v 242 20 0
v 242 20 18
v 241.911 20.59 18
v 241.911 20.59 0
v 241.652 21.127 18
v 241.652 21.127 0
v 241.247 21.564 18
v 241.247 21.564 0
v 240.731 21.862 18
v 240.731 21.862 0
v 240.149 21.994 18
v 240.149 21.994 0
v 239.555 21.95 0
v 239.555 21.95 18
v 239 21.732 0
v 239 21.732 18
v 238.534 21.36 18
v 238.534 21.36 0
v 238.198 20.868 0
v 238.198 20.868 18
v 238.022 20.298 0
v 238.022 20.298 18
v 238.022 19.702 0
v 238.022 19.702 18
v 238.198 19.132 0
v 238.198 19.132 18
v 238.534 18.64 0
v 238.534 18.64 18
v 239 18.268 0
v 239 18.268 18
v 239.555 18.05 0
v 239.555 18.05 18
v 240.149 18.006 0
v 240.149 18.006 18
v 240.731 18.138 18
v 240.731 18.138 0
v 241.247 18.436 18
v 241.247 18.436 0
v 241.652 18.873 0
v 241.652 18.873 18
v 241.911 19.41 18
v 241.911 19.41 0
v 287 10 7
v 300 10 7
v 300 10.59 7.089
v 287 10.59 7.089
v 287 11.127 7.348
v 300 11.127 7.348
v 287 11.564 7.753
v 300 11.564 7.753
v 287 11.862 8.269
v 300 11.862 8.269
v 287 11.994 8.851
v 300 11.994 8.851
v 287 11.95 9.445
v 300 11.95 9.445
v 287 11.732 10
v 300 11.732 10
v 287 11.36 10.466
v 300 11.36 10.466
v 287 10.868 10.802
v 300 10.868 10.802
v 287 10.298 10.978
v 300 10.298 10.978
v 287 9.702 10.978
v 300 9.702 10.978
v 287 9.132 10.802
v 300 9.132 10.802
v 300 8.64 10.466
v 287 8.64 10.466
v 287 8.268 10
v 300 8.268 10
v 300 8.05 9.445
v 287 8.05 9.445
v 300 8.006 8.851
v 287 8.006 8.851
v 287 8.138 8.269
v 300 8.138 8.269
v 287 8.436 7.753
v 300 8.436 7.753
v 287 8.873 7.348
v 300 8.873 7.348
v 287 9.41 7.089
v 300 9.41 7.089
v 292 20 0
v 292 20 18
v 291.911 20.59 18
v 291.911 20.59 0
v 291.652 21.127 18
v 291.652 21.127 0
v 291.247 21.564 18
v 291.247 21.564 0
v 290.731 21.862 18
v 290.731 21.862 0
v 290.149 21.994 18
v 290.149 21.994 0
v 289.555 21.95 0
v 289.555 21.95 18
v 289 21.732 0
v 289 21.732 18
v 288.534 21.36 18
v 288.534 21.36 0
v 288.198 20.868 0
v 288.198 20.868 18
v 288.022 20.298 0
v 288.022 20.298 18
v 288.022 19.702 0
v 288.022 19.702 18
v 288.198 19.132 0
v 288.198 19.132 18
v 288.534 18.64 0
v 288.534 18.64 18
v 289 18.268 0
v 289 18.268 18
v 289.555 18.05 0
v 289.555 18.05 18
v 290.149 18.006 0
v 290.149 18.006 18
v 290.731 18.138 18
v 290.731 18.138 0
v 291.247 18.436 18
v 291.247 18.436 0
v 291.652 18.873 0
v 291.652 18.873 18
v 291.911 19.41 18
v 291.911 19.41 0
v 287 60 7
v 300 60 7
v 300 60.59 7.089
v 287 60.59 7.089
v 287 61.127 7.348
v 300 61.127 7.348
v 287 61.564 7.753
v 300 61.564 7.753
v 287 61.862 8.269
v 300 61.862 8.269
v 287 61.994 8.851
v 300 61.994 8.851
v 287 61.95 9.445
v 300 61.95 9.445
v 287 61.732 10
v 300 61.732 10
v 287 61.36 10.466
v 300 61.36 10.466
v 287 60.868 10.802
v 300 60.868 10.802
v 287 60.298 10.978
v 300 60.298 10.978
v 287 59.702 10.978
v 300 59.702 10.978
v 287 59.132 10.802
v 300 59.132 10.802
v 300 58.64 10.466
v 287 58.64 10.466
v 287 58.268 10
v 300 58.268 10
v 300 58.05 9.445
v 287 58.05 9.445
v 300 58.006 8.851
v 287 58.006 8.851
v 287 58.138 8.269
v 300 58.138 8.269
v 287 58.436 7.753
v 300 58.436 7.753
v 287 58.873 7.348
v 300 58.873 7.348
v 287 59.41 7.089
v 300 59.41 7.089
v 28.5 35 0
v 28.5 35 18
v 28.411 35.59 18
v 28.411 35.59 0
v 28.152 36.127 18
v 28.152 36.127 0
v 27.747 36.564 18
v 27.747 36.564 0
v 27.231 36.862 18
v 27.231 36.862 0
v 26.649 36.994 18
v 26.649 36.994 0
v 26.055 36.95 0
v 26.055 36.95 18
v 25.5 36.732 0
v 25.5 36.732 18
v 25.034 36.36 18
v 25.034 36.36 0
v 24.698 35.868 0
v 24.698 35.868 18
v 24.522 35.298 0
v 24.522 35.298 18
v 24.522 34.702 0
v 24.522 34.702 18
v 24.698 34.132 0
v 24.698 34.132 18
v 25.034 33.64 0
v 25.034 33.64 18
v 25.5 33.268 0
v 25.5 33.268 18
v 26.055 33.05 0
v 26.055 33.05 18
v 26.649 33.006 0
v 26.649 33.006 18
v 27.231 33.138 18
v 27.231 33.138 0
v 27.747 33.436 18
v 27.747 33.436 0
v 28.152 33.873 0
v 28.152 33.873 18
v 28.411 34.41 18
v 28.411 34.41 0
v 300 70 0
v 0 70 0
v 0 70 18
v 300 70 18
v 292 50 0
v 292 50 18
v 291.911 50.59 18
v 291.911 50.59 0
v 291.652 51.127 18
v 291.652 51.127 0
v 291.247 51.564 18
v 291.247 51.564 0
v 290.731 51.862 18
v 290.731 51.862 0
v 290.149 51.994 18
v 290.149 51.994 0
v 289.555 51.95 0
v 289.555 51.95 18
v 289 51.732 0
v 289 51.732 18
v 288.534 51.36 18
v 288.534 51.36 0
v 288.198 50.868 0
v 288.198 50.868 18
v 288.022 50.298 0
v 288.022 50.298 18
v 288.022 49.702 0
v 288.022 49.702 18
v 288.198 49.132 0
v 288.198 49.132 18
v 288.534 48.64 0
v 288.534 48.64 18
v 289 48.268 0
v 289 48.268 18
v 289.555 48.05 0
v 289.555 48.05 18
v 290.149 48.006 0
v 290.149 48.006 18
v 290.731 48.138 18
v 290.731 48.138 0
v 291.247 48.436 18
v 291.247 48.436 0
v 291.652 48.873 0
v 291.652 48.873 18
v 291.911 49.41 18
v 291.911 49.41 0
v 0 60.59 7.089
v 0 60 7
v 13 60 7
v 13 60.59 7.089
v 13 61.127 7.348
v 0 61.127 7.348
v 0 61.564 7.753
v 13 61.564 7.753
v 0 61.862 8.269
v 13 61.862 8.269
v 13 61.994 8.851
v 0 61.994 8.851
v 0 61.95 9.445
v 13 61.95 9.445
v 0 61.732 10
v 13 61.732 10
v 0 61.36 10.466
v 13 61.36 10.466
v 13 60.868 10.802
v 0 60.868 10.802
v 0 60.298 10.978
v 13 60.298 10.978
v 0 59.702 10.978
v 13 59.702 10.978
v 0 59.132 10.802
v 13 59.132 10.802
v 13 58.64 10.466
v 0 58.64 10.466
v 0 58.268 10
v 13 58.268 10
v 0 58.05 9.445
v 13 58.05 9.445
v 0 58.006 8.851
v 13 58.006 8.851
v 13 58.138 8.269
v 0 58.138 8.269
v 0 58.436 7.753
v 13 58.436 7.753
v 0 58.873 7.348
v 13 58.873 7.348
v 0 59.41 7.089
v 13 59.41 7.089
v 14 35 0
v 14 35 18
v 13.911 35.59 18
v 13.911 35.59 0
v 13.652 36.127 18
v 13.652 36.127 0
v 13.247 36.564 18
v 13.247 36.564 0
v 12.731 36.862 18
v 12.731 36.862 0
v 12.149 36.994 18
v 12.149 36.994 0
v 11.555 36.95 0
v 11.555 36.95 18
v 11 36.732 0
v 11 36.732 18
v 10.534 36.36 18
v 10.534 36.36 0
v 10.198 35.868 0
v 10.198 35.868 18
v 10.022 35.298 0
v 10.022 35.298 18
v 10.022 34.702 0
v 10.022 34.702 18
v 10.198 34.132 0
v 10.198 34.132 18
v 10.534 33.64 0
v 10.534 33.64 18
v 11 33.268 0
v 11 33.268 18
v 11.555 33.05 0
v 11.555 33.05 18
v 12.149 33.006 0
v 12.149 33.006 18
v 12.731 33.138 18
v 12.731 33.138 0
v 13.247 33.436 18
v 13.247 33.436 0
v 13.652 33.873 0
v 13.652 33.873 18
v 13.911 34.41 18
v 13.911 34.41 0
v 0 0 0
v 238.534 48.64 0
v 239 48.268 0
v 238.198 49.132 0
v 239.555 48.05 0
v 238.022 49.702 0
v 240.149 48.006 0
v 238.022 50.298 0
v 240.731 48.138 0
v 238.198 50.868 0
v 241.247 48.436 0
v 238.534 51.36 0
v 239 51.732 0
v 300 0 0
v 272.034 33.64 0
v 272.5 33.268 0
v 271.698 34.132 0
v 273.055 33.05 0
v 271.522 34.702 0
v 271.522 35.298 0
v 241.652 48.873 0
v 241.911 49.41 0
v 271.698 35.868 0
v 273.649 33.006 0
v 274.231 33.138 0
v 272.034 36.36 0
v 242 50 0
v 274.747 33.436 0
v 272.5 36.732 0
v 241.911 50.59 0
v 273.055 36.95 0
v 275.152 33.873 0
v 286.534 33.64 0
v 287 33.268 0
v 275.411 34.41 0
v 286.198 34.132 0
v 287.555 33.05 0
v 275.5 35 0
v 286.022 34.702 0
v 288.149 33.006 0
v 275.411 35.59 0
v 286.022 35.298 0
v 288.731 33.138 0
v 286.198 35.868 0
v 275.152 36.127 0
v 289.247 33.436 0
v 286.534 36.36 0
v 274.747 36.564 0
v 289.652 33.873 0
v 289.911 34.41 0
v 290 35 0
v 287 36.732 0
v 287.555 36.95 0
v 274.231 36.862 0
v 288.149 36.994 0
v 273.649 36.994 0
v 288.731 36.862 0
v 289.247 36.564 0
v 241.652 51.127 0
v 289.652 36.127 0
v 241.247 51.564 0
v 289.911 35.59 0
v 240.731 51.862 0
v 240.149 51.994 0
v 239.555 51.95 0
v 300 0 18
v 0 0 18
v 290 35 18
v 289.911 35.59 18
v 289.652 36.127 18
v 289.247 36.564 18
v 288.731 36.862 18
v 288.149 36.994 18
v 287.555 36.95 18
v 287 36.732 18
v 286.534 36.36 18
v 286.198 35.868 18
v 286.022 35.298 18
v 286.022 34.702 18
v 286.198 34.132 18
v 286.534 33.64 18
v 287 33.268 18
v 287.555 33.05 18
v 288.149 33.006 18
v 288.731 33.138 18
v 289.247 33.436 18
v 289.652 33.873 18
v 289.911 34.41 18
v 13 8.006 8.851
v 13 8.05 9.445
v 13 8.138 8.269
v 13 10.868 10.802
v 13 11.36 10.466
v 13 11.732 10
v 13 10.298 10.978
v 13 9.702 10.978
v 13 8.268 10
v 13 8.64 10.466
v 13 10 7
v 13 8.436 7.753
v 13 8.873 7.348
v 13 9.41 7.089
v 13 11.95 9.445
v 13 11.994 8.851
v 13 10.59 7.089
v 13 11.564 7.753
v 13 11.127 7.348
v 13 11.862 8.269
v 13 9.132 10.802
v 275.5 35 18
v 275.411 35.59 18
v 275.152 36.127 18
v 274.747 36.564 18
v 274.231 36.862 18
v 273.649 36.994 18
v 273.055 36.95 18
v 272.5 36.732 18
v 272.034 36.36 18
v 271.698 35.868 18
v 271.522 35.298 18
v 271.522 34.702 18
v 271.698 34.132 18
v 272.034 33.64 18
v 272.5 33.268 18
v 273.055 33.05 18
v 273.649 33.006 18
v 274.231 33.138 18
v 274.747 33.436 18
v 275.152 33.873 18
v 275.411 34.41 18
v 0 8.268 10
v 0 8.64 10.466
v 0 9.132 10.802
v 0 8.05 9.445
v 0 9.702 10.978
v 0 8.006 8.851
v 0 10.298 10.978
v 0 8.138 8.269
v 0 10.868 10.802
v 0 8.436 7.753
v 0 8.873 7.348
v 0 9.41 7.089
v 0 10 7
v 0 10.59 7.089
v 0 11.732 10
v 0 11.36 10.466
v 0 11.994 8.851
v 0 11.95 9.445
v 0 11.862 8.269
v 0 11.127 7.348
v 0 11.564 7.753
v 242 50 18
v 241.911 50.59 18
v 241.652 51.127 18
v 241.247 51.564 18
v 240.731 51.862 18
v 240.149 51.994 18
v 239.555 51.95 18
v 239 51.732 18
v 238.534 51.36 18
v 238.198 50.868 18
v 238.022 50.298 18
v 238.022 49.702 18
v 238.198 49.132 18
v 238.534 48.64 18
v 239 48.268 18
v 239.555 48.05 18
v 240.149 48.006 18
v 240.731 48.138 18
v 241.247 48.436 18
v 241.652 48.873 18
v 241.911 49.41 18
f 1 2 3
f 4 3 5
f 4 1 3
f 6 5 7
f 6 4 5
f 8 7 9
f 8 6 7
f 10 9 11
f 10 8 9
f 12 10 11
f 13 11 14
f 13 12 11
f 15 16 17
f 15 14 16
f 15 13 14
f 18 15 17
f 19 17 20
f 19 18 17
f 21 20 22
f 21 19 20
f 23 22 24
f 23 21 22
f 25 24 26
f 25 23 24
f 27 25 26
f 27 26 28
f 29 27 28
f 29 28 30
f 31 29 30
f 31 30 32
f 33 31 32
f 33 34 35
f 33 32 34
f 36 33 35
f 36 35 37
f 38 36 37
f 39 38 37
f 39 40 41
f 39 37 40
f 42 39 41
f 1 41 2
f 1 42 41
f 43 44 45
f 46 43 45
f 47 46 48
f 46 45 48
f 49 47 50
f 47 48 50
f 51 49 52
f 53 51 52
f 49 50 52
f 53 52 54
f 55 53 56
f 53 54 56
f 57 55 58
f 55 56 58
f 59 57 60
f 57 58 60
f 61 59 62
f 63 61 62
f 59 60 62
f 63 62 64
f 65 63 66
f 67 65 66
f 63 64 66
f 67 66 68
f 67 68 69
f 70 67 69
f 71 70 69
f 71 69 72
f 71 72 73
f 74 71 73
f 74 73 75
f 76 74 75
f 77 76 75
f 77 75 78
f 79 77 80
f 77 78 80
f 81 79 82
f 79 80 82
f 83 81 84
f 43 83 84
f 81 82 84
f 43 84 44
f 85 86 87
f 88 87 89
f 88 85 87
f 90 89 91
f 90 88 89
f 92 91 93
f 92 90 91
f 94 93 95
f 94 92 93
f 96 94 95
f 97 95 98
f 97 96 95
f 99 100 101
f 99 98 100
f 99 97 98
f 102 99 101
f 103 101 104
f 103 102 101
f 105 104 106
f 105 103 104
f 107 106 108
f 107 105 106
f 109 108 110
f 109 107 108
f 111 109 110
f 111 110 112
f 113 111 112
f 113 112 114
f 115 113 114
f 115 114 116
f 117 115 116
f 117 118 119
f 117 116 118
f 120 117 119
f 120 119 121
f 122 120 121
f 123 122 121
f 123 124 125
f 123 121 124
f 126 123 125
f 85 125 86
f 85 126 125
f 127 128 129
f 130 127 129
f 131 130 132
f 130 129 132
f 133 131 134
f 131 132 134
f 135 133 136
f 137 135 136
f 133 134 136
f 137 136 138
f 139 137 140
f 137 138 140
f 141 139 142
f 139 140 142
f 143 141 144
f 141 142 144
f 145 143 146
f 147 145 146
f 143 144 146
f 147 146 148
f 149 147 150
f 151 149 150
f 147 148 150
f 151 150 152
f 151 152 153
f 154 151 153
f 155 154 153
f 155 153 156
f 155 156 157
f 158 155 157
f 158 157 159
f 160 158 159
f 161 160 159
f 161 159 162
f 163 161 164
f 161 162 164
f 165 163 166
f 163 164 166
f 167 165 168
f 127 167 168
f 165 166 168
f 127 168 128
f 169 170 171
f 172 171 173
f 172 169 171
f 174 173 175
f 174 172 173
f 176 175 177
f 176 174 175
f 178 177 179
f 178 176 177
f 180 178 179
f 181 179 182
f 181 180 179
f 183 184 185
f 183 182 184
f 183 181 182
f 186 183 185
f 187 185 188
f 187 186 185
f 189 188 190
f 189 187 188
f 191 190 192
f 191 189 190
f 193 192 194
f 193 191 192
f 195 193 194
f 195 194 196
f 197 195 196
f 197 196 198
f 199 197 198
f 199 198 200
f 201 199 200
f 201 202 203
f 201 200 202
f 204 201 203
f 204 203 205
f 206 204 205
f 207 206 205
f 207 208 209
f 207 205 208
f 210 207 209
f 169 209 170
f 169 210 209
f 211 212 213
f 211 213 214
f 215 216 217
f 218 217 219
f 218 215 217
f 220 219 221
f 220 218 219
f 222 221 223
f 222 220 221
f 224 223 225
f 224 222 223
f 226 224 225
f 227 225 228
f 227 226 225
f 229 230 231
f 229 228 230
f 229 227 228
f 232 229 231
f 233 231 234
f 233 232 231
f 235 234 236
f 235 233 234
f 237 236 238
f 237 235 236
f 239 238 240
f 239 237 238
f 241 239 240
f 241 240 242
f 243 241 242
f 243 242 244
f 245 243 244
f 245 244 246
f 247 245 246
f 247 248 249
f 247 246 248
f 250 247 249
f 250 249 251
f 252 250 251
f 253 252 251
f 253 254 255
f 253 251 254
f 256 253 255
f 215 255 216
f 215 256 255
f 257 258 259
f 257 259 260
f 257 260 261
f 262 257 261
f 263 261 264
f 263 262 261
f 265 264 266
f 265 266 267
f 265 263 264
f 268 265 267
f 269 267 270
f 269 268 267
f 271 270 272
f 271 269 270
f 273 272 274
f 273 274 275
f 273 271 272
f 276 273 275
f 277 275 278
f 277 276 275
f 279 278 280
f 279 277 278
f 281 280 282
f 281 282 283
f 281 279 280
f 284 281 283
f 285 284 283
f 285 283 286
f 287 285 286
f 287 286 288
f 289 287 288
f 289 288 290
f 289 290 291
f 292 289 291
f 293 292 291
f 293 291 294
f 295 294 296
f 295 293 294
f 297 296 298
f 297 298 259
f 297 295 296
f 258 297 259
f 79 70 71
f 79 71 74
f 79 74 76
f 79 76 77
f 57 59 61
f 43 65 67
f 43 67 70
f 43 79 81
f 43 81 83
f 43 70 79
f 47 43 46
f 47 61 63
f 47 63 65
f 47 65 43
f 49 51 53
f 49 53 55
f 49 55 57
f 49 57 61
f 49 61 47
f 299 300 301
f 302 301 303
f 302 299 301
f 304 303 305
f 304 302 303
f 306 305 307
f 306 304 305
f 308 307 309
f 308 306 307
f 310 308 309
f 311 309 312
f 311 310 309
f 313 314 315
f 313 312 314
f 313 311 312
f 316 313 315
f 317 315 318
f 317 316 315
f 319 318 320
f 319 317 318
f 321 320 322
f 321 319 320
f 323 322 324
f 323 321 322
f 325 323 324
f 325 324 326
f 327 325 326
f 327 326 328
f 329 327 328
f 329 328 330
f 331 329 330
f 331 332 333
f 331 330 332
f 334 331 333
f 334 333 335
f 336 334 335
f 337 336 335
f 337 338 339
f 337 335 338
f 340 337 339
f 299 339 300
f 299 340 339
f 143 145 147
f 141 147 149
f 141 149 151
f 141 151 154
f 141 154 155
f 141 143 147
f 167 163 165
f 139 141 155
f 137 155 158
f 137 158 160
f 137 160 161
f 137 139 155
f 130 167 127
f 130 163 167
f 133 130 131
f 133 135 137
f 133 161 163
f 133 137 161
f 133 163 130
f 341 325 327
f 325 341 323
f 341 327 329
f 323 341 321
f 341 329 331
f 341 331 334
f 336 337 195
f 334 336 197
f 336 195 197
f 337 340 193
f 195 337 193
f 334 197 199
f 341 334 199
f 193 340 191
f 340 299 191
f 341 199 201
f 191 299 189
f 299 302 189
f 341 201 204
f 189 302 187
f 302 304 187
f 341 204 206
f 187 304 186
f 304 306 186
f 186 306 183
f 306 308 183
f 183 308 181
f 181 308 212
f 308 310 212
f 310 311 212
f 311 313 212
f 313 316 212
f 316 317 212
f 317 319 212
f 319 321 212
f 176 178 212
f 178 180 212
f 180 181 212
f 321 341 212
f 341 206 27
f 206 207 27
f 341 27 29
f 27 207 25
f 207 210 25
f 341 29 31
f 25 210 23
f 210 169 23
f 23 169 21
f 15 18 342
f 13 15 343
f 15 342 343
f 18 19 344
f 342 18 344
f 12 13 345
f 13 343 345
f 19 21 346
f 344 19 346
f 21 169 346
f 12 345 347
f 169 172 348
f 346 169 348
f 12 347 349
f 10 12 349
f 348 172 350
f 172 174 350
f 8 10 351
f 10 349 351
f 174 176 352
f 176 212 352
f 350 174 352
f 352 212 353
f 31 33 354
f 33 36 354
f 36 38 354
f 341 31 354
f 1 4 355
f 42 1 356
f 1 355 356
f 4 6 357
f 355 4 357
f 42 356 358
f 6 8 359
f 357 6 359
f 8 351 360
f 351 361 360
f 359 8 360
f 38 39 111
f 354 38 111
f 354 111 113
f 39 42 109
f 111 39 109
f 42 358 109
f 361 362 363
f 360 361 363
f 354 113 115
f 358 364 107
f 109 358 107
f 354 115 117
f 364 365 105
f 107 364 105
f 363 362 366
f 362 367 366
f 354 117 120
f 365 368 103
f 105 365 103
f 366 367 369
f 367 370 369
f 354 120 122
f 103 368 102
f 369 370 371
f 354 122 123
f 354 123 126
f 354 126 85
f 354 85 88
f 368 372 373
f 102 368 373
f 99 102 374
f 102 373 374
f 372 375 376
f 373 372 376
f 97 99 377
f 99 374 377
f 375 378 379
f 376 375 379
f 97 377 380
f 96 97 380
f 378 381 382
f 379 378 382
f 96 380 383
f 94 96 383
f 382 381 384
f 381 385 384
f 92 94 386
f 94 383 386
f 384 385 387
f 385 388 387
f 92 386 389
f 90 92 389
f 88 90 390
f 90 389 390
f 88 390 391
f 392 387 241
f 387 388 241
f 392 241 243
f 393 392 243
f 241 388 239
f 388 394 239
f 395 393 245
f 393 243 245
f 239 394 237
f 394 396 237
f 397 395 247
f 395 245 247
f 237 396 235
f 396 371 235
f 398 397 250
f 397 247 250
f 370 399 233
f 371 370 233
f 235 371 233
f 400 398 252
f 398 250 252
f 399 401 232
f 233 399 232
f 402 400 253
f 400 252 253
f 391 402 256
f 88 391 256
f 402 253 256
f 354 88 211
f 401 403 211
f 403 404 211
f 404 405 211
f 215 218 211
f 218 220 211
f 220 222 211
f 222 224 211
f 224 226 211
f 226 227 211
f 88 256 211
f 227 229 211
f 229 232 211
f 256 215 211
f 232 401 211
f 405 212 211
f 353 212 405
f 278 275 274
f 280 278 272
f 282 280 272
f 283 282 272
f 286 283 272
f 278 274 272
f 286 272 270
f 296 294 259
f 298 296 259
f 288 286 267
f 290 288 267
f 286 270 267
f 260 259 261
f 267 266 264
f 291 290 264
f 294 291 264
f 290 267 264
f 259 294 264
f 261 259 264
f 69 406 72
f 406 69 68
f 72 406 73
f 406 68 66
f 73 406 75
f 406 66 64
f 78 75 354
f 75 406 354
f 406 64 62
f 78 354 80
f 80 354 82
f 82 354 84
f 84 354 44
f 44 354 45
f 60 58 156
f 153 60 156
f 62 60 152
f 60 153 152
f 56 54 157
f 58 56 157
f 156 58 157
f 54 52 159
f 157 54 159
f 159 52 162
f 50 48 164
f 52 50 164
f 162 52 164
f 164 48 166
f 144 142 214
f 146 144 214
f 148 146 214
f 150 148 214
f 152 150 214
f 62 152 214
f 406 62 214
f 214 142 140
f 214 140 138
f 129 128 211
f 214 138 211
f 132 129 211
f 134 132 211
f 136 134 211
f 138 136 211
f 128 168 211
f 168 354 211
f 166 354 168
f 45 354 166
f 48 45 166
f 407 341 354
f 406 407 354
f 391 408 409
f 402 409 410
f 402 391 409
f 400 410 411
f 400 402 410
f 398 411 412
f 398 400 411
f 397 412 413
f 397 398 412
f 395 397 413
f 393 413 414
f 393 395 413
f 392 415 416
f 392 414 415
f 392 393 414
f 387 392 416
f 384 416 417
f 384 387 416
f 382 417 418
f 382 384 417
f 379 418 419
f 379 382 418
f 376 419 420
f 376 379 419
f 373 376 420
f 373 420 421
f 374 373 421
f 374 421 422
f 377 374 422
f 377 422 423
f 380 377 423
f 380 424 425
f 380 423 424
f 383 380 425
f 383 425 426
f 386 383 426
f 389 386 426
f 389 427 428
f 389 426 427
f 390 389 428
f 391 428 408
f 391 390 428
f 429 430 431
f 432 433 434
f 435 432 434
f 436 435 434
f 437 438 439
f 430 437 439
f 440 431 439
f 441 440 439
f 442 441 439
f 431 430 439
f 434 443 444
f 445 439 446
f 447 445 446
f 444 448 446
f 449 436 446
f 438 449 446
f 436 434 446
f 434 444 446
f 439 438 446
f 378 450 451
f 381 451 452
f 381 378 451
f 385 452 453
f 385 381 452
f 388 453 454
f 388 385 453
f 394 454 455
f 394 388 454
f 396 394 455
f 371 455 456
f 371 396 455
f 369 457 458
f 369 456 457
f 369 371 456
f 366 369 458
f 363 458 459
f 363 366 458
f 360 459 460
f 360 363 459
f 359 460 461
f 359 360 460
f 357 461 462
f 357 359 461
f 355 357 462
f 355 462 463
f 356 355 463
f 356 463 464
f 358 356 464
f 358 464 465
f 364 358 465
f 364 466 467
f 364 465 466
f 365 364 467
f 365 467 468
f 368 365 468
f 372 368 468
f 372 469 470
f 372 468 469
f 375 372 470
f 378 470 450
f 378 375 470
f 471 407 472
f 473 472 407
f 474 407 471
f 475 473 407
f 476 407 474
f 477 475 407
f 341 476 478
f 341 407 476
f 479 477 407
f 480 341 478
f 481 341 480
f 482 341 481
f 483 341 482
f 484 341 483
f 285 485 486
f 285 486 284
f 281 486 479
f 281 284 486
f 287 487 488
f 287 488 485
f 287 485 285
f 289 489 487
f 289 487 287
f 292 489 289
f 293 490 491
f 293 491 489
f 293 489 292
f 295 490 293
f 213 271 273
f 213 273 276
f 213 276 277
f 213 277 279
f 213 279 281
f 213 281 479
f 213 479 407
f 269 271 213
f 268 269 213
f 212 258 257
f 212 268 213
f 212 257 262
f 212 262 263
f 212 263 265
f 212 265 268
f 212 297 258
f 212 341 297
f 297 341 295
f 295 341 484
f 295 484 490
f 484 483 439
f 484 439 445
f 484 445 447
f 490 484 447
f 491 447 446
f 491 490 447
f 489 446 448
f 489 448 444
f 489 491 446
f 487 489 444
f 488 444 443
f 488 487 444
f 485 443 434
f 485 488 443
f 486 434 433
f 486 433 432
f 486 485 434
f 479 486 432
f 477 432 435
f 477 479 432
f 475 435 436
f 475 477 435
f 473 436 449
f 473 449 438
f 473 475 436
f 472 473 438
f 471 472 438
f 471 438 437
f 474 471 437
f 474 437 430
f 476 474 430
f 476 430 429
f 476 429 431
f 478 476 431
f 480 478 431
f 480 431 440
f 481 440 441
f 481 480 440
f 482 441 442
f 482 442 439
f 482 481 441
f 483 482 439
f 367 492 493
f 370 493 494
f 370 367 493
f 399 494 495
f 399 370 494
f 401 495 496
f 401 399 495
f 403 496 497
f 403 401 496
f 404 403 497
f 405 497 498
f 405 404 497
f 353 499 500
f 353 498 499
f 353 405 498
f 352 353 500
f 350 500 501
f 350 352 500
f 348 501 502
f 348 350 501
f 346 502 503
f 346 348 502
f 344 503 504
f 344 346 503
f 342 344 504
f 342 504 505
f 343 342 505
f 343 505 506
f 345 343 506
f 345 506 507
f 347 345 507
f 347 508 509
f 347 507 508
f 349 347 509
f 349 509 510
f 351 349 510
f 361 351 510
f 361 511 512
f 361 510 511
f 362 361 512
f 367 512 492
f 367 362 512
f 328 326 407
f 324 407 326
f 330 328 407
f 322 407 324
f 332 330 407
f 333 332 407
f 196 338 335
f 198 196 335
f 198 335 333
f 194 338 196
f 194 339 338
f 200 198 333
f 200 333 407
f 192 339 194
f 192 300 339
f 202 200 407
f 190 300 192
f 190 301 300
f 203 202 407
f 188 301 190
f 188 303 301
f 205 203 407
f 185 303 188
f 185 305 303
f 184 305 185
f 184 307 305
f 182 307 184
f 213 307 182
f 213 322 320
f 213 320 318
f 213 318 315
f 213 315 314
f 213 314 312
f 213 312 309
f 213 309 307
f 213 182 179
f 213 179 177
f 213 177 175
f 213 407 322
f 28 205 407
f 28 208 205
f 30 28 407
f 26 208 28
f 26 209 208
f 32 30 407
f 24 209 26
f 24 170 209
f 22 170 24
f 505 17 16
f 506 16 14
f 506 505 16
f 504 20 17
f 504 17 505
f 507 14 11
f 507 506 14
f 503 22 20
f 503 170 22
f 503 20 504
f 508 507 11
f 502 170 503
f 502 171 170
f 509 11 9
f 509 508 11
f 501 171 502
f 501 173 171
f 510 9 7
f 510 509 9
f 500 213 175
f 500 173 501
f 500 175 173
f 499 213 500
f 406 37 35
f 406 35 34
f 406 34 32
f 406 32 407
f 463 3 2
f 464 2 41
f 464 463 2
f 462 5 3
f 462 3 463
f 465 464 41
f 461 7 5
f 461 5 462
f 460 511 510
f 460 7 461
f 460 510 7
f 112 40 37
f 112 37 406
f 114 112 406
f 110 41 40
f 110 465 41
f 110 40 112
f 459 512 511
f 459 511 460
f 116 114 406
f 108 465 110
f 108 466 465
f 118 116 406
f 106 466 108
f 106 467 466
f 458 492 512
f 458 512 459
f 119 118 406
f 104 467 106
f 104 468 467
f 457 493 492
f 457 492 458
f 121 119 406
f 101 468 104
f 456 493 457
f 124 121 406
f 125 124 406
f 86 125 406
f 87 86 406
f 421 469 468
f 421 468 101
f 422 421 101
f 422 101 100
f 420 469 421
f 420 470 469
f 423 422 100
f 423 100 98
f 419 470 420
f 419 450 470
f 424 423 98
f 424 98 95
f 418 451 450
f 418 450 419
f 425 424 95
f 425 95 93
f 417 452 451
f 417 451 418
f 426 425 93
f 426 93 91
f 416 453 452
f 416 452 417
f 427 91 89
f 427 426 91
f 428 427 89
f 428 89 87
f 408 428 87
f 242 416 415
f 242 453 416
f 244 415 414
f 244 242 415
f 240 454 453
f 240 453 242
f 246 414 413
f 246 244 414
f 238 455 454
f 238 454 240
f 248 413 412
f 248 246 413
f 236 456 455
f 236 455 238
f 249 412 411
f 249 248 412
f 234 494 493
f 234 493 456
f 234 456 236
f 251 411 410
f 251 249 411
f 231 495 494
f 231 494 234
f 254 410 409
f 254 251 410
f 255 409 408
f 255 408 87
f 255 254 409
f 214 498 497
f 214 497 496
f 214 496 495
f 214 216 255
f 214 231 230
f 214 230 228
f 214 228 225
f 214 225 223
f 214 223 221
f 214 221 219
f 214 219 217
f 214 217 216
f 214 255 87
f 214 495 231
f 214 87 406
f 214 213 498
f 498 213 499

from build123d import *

# Parameters (mm, degrees)
CYLINDER005_R           = 2
CYLINDER005_DEPTH       = 13
CYLINDER005_PITCH_ANGLE = 90
CYLINDER006_R           = 2
CYLINDER006_DEPTH       = 13
CYLINDER006_PITCH_ANGLE = 90
CYLINDER003_R           = 2
CYLINDER003_DEPTH       = 25
CYLINDER004_R           = 2
CYLINDER004_DEPTH       = 25
CYLINDER002_R           = 2
CYLINDER002_DEPTH       = 25
ARRAY_X_COUNT           = 2
ARRAY_X_PITCH           = 50
ARRAY_Y_COUNT           = 2
ARRAY_Y_PITCH           = 30
CYLINDER001_R           = 2
CYLINDER001_DEPTH       = 25
CYLINDER_R              = 2
CYLINDER_DEPTH          = 25
BOX_W                   = 300
BOX_H                   = 70
BOX_DEPTH               = 18


with BuildPart() as cilindro005:
    # Cylinder005 → Cylinder005 (new body)
    with BuildSketch(Plane.XY):
        Circle(CYLINDER005_R)
    extrude(amount=CYLINDER005_DEPTH)


with BuildPart() as cilindro005_1:
    # Cylinder005 pitch: moved
    add(cilindro005.part.rotate(Axis((0, 0, 0), (0, 1, 0)), CYLINDER005_PITCH_ANGLE))


with BuildPart() as cilindro005_2:
    # Cylinder005 placement: moved
    add(cilindro005_1.part.moved(Location((0, 10, 9))))


with BuildPart() as fusion003:
    # Cylinder006 → Cylinder006 (new body)
    with BuildSketch(Plane.XY):
        Circle(CYLINDER006_R)
    extrude(amount=CYLINDER006_DEPTH)


with BuildPart() as fusion003_1:
    # Cylinder006 pitch: moved
    add(fusion003.part.rotate(Axis((0, 0, 0), (0, 1, 0)), CYLINDER006_PITCH_ANGLE))


with BuildPart() as fusion003_2:
    # Cylinder006 placement: moved
    add(fusion003_1.part.moved(Location((0, 60, 9))))

    # Fusion003: union Cilindro005
    add(cilindro005_2.part)


with BuildPart() as mirror_of_fusion003:
    # mirror: instance of Fusion003
    add(fusion003_2.part.mirror(Plane(origin=(300, 0, 18), x_dir=(0, -1, 0), z_dir=(1, 0, 0))))


with BuildPart() as mirror_of_fusion003_1:
    # mirror placement: moved
    add(mirror_of_fusion003.part.moved(Location((-300, 0, 0))))


with BuildPart() as cilindro003:
    # Cylinder003 → Cylinder003 (new body)
    with BuildSketch(Plane(origin=(26.5, 35, 0), x_dir=(1, 0, 0), z_dir=(0, 0, 1))):
        Circle(CYLINDER003_R)
    extrude(amount=CYLINDER003_DEPTH)


with BuildPart() as fusion001:
    # Cylinder004 → Cylinder004 (new body)
    with BuildSketch(Plane(origin=(12, 35, 0), x_dir=(1, 0, 0), z_dir=(0, 0, 1))):
        Circle(CYLINDER004_R)
    extrude(amount=CYLINDER004_DEPTH)

    # Fusion001: union Cilindro003
    add(cilindro003.part)


with BuildPart() as fusion001_1:
    # Fusion001 placement: moved
    add(fusion001.part.moved(Location((261.5, 0, 0))))


with BuildPart() as array:
    # Cylinder002 → Cylinder002 (new body)
    with BuildSketch(Plane.XY):
        Circle(CYLINDER002_R)
    extrude(amount=CYLINDER002_DEPTH)

    # Array X: Array ×2


with BuildPart() as array_1:
    add(array.part)
    with Locations(*[(i * ARRAY_X_PITCH, 0, 0) for i in range(1, ARRAY_X_COUNT)]):
        add(array.part)

    # Array Y: Array ×2


with BuildPart() as array_2:
    add(array_1.part)
    with Locations(*[(0, i * ARRAY_Y_PITCH, 0) for i in range(1, ARRAY_Y_COUNT)]):
        add(array_1.part)


with BuildPart() as array_3:
    # Array placement: moved
    add(array_2.part.moved(Location((240, 20, 0))))


with BuildPart() as cilindro001:
    # Cylinder001 → Cylinder001 (new body)
    with BuildSketch(Plane(origin=(26.5, 35, 0), x_dir=(1, 0, 0), z_dir=(0, 0, 1))):
        Circle(CYLINDER001_R)
    extrude(amount=CYLINDER001_DEPTH)


with BuildPart() as fusion002:
    # Cylinder → Cylinder (new body)
    with BuildSketch(Plane(origin=(12, 35, 0), x_dir=(1, 0, 0), z_dir=(0, 0, 1))):
        Circle(CYLINDER_R)
    extrude(amount=CYLINDER_DEPTH)

    # Fusion: union Cilindro001
    add(cilindro001.part)

    # Fusion002: union Fusion001, Array
    add(fusion001_1.part)
    add(array_3.part)


with BuildPart() as cut002:
    # Box → Box (new body)
    with BuildSketch(Plane.XY):
        with Locations((150, 35)):
            Rectangle(BOX_W, BOX_H)
    extrude(amount=BOX_DEPTH)

    # Cut: cut Fusion002
    add(fusion002.part, mode=Mode.SUBTRACT)

    # Cut001: cut Mirror of Fusion003
    add(mirror_of_fusion003_1.part, mode=Mode.SUBTRACT)

    # Cut002: cut Fusion003
    add(fusion003_2.part, mode=Mode.SUBTRACT)


solid = cut002.part
